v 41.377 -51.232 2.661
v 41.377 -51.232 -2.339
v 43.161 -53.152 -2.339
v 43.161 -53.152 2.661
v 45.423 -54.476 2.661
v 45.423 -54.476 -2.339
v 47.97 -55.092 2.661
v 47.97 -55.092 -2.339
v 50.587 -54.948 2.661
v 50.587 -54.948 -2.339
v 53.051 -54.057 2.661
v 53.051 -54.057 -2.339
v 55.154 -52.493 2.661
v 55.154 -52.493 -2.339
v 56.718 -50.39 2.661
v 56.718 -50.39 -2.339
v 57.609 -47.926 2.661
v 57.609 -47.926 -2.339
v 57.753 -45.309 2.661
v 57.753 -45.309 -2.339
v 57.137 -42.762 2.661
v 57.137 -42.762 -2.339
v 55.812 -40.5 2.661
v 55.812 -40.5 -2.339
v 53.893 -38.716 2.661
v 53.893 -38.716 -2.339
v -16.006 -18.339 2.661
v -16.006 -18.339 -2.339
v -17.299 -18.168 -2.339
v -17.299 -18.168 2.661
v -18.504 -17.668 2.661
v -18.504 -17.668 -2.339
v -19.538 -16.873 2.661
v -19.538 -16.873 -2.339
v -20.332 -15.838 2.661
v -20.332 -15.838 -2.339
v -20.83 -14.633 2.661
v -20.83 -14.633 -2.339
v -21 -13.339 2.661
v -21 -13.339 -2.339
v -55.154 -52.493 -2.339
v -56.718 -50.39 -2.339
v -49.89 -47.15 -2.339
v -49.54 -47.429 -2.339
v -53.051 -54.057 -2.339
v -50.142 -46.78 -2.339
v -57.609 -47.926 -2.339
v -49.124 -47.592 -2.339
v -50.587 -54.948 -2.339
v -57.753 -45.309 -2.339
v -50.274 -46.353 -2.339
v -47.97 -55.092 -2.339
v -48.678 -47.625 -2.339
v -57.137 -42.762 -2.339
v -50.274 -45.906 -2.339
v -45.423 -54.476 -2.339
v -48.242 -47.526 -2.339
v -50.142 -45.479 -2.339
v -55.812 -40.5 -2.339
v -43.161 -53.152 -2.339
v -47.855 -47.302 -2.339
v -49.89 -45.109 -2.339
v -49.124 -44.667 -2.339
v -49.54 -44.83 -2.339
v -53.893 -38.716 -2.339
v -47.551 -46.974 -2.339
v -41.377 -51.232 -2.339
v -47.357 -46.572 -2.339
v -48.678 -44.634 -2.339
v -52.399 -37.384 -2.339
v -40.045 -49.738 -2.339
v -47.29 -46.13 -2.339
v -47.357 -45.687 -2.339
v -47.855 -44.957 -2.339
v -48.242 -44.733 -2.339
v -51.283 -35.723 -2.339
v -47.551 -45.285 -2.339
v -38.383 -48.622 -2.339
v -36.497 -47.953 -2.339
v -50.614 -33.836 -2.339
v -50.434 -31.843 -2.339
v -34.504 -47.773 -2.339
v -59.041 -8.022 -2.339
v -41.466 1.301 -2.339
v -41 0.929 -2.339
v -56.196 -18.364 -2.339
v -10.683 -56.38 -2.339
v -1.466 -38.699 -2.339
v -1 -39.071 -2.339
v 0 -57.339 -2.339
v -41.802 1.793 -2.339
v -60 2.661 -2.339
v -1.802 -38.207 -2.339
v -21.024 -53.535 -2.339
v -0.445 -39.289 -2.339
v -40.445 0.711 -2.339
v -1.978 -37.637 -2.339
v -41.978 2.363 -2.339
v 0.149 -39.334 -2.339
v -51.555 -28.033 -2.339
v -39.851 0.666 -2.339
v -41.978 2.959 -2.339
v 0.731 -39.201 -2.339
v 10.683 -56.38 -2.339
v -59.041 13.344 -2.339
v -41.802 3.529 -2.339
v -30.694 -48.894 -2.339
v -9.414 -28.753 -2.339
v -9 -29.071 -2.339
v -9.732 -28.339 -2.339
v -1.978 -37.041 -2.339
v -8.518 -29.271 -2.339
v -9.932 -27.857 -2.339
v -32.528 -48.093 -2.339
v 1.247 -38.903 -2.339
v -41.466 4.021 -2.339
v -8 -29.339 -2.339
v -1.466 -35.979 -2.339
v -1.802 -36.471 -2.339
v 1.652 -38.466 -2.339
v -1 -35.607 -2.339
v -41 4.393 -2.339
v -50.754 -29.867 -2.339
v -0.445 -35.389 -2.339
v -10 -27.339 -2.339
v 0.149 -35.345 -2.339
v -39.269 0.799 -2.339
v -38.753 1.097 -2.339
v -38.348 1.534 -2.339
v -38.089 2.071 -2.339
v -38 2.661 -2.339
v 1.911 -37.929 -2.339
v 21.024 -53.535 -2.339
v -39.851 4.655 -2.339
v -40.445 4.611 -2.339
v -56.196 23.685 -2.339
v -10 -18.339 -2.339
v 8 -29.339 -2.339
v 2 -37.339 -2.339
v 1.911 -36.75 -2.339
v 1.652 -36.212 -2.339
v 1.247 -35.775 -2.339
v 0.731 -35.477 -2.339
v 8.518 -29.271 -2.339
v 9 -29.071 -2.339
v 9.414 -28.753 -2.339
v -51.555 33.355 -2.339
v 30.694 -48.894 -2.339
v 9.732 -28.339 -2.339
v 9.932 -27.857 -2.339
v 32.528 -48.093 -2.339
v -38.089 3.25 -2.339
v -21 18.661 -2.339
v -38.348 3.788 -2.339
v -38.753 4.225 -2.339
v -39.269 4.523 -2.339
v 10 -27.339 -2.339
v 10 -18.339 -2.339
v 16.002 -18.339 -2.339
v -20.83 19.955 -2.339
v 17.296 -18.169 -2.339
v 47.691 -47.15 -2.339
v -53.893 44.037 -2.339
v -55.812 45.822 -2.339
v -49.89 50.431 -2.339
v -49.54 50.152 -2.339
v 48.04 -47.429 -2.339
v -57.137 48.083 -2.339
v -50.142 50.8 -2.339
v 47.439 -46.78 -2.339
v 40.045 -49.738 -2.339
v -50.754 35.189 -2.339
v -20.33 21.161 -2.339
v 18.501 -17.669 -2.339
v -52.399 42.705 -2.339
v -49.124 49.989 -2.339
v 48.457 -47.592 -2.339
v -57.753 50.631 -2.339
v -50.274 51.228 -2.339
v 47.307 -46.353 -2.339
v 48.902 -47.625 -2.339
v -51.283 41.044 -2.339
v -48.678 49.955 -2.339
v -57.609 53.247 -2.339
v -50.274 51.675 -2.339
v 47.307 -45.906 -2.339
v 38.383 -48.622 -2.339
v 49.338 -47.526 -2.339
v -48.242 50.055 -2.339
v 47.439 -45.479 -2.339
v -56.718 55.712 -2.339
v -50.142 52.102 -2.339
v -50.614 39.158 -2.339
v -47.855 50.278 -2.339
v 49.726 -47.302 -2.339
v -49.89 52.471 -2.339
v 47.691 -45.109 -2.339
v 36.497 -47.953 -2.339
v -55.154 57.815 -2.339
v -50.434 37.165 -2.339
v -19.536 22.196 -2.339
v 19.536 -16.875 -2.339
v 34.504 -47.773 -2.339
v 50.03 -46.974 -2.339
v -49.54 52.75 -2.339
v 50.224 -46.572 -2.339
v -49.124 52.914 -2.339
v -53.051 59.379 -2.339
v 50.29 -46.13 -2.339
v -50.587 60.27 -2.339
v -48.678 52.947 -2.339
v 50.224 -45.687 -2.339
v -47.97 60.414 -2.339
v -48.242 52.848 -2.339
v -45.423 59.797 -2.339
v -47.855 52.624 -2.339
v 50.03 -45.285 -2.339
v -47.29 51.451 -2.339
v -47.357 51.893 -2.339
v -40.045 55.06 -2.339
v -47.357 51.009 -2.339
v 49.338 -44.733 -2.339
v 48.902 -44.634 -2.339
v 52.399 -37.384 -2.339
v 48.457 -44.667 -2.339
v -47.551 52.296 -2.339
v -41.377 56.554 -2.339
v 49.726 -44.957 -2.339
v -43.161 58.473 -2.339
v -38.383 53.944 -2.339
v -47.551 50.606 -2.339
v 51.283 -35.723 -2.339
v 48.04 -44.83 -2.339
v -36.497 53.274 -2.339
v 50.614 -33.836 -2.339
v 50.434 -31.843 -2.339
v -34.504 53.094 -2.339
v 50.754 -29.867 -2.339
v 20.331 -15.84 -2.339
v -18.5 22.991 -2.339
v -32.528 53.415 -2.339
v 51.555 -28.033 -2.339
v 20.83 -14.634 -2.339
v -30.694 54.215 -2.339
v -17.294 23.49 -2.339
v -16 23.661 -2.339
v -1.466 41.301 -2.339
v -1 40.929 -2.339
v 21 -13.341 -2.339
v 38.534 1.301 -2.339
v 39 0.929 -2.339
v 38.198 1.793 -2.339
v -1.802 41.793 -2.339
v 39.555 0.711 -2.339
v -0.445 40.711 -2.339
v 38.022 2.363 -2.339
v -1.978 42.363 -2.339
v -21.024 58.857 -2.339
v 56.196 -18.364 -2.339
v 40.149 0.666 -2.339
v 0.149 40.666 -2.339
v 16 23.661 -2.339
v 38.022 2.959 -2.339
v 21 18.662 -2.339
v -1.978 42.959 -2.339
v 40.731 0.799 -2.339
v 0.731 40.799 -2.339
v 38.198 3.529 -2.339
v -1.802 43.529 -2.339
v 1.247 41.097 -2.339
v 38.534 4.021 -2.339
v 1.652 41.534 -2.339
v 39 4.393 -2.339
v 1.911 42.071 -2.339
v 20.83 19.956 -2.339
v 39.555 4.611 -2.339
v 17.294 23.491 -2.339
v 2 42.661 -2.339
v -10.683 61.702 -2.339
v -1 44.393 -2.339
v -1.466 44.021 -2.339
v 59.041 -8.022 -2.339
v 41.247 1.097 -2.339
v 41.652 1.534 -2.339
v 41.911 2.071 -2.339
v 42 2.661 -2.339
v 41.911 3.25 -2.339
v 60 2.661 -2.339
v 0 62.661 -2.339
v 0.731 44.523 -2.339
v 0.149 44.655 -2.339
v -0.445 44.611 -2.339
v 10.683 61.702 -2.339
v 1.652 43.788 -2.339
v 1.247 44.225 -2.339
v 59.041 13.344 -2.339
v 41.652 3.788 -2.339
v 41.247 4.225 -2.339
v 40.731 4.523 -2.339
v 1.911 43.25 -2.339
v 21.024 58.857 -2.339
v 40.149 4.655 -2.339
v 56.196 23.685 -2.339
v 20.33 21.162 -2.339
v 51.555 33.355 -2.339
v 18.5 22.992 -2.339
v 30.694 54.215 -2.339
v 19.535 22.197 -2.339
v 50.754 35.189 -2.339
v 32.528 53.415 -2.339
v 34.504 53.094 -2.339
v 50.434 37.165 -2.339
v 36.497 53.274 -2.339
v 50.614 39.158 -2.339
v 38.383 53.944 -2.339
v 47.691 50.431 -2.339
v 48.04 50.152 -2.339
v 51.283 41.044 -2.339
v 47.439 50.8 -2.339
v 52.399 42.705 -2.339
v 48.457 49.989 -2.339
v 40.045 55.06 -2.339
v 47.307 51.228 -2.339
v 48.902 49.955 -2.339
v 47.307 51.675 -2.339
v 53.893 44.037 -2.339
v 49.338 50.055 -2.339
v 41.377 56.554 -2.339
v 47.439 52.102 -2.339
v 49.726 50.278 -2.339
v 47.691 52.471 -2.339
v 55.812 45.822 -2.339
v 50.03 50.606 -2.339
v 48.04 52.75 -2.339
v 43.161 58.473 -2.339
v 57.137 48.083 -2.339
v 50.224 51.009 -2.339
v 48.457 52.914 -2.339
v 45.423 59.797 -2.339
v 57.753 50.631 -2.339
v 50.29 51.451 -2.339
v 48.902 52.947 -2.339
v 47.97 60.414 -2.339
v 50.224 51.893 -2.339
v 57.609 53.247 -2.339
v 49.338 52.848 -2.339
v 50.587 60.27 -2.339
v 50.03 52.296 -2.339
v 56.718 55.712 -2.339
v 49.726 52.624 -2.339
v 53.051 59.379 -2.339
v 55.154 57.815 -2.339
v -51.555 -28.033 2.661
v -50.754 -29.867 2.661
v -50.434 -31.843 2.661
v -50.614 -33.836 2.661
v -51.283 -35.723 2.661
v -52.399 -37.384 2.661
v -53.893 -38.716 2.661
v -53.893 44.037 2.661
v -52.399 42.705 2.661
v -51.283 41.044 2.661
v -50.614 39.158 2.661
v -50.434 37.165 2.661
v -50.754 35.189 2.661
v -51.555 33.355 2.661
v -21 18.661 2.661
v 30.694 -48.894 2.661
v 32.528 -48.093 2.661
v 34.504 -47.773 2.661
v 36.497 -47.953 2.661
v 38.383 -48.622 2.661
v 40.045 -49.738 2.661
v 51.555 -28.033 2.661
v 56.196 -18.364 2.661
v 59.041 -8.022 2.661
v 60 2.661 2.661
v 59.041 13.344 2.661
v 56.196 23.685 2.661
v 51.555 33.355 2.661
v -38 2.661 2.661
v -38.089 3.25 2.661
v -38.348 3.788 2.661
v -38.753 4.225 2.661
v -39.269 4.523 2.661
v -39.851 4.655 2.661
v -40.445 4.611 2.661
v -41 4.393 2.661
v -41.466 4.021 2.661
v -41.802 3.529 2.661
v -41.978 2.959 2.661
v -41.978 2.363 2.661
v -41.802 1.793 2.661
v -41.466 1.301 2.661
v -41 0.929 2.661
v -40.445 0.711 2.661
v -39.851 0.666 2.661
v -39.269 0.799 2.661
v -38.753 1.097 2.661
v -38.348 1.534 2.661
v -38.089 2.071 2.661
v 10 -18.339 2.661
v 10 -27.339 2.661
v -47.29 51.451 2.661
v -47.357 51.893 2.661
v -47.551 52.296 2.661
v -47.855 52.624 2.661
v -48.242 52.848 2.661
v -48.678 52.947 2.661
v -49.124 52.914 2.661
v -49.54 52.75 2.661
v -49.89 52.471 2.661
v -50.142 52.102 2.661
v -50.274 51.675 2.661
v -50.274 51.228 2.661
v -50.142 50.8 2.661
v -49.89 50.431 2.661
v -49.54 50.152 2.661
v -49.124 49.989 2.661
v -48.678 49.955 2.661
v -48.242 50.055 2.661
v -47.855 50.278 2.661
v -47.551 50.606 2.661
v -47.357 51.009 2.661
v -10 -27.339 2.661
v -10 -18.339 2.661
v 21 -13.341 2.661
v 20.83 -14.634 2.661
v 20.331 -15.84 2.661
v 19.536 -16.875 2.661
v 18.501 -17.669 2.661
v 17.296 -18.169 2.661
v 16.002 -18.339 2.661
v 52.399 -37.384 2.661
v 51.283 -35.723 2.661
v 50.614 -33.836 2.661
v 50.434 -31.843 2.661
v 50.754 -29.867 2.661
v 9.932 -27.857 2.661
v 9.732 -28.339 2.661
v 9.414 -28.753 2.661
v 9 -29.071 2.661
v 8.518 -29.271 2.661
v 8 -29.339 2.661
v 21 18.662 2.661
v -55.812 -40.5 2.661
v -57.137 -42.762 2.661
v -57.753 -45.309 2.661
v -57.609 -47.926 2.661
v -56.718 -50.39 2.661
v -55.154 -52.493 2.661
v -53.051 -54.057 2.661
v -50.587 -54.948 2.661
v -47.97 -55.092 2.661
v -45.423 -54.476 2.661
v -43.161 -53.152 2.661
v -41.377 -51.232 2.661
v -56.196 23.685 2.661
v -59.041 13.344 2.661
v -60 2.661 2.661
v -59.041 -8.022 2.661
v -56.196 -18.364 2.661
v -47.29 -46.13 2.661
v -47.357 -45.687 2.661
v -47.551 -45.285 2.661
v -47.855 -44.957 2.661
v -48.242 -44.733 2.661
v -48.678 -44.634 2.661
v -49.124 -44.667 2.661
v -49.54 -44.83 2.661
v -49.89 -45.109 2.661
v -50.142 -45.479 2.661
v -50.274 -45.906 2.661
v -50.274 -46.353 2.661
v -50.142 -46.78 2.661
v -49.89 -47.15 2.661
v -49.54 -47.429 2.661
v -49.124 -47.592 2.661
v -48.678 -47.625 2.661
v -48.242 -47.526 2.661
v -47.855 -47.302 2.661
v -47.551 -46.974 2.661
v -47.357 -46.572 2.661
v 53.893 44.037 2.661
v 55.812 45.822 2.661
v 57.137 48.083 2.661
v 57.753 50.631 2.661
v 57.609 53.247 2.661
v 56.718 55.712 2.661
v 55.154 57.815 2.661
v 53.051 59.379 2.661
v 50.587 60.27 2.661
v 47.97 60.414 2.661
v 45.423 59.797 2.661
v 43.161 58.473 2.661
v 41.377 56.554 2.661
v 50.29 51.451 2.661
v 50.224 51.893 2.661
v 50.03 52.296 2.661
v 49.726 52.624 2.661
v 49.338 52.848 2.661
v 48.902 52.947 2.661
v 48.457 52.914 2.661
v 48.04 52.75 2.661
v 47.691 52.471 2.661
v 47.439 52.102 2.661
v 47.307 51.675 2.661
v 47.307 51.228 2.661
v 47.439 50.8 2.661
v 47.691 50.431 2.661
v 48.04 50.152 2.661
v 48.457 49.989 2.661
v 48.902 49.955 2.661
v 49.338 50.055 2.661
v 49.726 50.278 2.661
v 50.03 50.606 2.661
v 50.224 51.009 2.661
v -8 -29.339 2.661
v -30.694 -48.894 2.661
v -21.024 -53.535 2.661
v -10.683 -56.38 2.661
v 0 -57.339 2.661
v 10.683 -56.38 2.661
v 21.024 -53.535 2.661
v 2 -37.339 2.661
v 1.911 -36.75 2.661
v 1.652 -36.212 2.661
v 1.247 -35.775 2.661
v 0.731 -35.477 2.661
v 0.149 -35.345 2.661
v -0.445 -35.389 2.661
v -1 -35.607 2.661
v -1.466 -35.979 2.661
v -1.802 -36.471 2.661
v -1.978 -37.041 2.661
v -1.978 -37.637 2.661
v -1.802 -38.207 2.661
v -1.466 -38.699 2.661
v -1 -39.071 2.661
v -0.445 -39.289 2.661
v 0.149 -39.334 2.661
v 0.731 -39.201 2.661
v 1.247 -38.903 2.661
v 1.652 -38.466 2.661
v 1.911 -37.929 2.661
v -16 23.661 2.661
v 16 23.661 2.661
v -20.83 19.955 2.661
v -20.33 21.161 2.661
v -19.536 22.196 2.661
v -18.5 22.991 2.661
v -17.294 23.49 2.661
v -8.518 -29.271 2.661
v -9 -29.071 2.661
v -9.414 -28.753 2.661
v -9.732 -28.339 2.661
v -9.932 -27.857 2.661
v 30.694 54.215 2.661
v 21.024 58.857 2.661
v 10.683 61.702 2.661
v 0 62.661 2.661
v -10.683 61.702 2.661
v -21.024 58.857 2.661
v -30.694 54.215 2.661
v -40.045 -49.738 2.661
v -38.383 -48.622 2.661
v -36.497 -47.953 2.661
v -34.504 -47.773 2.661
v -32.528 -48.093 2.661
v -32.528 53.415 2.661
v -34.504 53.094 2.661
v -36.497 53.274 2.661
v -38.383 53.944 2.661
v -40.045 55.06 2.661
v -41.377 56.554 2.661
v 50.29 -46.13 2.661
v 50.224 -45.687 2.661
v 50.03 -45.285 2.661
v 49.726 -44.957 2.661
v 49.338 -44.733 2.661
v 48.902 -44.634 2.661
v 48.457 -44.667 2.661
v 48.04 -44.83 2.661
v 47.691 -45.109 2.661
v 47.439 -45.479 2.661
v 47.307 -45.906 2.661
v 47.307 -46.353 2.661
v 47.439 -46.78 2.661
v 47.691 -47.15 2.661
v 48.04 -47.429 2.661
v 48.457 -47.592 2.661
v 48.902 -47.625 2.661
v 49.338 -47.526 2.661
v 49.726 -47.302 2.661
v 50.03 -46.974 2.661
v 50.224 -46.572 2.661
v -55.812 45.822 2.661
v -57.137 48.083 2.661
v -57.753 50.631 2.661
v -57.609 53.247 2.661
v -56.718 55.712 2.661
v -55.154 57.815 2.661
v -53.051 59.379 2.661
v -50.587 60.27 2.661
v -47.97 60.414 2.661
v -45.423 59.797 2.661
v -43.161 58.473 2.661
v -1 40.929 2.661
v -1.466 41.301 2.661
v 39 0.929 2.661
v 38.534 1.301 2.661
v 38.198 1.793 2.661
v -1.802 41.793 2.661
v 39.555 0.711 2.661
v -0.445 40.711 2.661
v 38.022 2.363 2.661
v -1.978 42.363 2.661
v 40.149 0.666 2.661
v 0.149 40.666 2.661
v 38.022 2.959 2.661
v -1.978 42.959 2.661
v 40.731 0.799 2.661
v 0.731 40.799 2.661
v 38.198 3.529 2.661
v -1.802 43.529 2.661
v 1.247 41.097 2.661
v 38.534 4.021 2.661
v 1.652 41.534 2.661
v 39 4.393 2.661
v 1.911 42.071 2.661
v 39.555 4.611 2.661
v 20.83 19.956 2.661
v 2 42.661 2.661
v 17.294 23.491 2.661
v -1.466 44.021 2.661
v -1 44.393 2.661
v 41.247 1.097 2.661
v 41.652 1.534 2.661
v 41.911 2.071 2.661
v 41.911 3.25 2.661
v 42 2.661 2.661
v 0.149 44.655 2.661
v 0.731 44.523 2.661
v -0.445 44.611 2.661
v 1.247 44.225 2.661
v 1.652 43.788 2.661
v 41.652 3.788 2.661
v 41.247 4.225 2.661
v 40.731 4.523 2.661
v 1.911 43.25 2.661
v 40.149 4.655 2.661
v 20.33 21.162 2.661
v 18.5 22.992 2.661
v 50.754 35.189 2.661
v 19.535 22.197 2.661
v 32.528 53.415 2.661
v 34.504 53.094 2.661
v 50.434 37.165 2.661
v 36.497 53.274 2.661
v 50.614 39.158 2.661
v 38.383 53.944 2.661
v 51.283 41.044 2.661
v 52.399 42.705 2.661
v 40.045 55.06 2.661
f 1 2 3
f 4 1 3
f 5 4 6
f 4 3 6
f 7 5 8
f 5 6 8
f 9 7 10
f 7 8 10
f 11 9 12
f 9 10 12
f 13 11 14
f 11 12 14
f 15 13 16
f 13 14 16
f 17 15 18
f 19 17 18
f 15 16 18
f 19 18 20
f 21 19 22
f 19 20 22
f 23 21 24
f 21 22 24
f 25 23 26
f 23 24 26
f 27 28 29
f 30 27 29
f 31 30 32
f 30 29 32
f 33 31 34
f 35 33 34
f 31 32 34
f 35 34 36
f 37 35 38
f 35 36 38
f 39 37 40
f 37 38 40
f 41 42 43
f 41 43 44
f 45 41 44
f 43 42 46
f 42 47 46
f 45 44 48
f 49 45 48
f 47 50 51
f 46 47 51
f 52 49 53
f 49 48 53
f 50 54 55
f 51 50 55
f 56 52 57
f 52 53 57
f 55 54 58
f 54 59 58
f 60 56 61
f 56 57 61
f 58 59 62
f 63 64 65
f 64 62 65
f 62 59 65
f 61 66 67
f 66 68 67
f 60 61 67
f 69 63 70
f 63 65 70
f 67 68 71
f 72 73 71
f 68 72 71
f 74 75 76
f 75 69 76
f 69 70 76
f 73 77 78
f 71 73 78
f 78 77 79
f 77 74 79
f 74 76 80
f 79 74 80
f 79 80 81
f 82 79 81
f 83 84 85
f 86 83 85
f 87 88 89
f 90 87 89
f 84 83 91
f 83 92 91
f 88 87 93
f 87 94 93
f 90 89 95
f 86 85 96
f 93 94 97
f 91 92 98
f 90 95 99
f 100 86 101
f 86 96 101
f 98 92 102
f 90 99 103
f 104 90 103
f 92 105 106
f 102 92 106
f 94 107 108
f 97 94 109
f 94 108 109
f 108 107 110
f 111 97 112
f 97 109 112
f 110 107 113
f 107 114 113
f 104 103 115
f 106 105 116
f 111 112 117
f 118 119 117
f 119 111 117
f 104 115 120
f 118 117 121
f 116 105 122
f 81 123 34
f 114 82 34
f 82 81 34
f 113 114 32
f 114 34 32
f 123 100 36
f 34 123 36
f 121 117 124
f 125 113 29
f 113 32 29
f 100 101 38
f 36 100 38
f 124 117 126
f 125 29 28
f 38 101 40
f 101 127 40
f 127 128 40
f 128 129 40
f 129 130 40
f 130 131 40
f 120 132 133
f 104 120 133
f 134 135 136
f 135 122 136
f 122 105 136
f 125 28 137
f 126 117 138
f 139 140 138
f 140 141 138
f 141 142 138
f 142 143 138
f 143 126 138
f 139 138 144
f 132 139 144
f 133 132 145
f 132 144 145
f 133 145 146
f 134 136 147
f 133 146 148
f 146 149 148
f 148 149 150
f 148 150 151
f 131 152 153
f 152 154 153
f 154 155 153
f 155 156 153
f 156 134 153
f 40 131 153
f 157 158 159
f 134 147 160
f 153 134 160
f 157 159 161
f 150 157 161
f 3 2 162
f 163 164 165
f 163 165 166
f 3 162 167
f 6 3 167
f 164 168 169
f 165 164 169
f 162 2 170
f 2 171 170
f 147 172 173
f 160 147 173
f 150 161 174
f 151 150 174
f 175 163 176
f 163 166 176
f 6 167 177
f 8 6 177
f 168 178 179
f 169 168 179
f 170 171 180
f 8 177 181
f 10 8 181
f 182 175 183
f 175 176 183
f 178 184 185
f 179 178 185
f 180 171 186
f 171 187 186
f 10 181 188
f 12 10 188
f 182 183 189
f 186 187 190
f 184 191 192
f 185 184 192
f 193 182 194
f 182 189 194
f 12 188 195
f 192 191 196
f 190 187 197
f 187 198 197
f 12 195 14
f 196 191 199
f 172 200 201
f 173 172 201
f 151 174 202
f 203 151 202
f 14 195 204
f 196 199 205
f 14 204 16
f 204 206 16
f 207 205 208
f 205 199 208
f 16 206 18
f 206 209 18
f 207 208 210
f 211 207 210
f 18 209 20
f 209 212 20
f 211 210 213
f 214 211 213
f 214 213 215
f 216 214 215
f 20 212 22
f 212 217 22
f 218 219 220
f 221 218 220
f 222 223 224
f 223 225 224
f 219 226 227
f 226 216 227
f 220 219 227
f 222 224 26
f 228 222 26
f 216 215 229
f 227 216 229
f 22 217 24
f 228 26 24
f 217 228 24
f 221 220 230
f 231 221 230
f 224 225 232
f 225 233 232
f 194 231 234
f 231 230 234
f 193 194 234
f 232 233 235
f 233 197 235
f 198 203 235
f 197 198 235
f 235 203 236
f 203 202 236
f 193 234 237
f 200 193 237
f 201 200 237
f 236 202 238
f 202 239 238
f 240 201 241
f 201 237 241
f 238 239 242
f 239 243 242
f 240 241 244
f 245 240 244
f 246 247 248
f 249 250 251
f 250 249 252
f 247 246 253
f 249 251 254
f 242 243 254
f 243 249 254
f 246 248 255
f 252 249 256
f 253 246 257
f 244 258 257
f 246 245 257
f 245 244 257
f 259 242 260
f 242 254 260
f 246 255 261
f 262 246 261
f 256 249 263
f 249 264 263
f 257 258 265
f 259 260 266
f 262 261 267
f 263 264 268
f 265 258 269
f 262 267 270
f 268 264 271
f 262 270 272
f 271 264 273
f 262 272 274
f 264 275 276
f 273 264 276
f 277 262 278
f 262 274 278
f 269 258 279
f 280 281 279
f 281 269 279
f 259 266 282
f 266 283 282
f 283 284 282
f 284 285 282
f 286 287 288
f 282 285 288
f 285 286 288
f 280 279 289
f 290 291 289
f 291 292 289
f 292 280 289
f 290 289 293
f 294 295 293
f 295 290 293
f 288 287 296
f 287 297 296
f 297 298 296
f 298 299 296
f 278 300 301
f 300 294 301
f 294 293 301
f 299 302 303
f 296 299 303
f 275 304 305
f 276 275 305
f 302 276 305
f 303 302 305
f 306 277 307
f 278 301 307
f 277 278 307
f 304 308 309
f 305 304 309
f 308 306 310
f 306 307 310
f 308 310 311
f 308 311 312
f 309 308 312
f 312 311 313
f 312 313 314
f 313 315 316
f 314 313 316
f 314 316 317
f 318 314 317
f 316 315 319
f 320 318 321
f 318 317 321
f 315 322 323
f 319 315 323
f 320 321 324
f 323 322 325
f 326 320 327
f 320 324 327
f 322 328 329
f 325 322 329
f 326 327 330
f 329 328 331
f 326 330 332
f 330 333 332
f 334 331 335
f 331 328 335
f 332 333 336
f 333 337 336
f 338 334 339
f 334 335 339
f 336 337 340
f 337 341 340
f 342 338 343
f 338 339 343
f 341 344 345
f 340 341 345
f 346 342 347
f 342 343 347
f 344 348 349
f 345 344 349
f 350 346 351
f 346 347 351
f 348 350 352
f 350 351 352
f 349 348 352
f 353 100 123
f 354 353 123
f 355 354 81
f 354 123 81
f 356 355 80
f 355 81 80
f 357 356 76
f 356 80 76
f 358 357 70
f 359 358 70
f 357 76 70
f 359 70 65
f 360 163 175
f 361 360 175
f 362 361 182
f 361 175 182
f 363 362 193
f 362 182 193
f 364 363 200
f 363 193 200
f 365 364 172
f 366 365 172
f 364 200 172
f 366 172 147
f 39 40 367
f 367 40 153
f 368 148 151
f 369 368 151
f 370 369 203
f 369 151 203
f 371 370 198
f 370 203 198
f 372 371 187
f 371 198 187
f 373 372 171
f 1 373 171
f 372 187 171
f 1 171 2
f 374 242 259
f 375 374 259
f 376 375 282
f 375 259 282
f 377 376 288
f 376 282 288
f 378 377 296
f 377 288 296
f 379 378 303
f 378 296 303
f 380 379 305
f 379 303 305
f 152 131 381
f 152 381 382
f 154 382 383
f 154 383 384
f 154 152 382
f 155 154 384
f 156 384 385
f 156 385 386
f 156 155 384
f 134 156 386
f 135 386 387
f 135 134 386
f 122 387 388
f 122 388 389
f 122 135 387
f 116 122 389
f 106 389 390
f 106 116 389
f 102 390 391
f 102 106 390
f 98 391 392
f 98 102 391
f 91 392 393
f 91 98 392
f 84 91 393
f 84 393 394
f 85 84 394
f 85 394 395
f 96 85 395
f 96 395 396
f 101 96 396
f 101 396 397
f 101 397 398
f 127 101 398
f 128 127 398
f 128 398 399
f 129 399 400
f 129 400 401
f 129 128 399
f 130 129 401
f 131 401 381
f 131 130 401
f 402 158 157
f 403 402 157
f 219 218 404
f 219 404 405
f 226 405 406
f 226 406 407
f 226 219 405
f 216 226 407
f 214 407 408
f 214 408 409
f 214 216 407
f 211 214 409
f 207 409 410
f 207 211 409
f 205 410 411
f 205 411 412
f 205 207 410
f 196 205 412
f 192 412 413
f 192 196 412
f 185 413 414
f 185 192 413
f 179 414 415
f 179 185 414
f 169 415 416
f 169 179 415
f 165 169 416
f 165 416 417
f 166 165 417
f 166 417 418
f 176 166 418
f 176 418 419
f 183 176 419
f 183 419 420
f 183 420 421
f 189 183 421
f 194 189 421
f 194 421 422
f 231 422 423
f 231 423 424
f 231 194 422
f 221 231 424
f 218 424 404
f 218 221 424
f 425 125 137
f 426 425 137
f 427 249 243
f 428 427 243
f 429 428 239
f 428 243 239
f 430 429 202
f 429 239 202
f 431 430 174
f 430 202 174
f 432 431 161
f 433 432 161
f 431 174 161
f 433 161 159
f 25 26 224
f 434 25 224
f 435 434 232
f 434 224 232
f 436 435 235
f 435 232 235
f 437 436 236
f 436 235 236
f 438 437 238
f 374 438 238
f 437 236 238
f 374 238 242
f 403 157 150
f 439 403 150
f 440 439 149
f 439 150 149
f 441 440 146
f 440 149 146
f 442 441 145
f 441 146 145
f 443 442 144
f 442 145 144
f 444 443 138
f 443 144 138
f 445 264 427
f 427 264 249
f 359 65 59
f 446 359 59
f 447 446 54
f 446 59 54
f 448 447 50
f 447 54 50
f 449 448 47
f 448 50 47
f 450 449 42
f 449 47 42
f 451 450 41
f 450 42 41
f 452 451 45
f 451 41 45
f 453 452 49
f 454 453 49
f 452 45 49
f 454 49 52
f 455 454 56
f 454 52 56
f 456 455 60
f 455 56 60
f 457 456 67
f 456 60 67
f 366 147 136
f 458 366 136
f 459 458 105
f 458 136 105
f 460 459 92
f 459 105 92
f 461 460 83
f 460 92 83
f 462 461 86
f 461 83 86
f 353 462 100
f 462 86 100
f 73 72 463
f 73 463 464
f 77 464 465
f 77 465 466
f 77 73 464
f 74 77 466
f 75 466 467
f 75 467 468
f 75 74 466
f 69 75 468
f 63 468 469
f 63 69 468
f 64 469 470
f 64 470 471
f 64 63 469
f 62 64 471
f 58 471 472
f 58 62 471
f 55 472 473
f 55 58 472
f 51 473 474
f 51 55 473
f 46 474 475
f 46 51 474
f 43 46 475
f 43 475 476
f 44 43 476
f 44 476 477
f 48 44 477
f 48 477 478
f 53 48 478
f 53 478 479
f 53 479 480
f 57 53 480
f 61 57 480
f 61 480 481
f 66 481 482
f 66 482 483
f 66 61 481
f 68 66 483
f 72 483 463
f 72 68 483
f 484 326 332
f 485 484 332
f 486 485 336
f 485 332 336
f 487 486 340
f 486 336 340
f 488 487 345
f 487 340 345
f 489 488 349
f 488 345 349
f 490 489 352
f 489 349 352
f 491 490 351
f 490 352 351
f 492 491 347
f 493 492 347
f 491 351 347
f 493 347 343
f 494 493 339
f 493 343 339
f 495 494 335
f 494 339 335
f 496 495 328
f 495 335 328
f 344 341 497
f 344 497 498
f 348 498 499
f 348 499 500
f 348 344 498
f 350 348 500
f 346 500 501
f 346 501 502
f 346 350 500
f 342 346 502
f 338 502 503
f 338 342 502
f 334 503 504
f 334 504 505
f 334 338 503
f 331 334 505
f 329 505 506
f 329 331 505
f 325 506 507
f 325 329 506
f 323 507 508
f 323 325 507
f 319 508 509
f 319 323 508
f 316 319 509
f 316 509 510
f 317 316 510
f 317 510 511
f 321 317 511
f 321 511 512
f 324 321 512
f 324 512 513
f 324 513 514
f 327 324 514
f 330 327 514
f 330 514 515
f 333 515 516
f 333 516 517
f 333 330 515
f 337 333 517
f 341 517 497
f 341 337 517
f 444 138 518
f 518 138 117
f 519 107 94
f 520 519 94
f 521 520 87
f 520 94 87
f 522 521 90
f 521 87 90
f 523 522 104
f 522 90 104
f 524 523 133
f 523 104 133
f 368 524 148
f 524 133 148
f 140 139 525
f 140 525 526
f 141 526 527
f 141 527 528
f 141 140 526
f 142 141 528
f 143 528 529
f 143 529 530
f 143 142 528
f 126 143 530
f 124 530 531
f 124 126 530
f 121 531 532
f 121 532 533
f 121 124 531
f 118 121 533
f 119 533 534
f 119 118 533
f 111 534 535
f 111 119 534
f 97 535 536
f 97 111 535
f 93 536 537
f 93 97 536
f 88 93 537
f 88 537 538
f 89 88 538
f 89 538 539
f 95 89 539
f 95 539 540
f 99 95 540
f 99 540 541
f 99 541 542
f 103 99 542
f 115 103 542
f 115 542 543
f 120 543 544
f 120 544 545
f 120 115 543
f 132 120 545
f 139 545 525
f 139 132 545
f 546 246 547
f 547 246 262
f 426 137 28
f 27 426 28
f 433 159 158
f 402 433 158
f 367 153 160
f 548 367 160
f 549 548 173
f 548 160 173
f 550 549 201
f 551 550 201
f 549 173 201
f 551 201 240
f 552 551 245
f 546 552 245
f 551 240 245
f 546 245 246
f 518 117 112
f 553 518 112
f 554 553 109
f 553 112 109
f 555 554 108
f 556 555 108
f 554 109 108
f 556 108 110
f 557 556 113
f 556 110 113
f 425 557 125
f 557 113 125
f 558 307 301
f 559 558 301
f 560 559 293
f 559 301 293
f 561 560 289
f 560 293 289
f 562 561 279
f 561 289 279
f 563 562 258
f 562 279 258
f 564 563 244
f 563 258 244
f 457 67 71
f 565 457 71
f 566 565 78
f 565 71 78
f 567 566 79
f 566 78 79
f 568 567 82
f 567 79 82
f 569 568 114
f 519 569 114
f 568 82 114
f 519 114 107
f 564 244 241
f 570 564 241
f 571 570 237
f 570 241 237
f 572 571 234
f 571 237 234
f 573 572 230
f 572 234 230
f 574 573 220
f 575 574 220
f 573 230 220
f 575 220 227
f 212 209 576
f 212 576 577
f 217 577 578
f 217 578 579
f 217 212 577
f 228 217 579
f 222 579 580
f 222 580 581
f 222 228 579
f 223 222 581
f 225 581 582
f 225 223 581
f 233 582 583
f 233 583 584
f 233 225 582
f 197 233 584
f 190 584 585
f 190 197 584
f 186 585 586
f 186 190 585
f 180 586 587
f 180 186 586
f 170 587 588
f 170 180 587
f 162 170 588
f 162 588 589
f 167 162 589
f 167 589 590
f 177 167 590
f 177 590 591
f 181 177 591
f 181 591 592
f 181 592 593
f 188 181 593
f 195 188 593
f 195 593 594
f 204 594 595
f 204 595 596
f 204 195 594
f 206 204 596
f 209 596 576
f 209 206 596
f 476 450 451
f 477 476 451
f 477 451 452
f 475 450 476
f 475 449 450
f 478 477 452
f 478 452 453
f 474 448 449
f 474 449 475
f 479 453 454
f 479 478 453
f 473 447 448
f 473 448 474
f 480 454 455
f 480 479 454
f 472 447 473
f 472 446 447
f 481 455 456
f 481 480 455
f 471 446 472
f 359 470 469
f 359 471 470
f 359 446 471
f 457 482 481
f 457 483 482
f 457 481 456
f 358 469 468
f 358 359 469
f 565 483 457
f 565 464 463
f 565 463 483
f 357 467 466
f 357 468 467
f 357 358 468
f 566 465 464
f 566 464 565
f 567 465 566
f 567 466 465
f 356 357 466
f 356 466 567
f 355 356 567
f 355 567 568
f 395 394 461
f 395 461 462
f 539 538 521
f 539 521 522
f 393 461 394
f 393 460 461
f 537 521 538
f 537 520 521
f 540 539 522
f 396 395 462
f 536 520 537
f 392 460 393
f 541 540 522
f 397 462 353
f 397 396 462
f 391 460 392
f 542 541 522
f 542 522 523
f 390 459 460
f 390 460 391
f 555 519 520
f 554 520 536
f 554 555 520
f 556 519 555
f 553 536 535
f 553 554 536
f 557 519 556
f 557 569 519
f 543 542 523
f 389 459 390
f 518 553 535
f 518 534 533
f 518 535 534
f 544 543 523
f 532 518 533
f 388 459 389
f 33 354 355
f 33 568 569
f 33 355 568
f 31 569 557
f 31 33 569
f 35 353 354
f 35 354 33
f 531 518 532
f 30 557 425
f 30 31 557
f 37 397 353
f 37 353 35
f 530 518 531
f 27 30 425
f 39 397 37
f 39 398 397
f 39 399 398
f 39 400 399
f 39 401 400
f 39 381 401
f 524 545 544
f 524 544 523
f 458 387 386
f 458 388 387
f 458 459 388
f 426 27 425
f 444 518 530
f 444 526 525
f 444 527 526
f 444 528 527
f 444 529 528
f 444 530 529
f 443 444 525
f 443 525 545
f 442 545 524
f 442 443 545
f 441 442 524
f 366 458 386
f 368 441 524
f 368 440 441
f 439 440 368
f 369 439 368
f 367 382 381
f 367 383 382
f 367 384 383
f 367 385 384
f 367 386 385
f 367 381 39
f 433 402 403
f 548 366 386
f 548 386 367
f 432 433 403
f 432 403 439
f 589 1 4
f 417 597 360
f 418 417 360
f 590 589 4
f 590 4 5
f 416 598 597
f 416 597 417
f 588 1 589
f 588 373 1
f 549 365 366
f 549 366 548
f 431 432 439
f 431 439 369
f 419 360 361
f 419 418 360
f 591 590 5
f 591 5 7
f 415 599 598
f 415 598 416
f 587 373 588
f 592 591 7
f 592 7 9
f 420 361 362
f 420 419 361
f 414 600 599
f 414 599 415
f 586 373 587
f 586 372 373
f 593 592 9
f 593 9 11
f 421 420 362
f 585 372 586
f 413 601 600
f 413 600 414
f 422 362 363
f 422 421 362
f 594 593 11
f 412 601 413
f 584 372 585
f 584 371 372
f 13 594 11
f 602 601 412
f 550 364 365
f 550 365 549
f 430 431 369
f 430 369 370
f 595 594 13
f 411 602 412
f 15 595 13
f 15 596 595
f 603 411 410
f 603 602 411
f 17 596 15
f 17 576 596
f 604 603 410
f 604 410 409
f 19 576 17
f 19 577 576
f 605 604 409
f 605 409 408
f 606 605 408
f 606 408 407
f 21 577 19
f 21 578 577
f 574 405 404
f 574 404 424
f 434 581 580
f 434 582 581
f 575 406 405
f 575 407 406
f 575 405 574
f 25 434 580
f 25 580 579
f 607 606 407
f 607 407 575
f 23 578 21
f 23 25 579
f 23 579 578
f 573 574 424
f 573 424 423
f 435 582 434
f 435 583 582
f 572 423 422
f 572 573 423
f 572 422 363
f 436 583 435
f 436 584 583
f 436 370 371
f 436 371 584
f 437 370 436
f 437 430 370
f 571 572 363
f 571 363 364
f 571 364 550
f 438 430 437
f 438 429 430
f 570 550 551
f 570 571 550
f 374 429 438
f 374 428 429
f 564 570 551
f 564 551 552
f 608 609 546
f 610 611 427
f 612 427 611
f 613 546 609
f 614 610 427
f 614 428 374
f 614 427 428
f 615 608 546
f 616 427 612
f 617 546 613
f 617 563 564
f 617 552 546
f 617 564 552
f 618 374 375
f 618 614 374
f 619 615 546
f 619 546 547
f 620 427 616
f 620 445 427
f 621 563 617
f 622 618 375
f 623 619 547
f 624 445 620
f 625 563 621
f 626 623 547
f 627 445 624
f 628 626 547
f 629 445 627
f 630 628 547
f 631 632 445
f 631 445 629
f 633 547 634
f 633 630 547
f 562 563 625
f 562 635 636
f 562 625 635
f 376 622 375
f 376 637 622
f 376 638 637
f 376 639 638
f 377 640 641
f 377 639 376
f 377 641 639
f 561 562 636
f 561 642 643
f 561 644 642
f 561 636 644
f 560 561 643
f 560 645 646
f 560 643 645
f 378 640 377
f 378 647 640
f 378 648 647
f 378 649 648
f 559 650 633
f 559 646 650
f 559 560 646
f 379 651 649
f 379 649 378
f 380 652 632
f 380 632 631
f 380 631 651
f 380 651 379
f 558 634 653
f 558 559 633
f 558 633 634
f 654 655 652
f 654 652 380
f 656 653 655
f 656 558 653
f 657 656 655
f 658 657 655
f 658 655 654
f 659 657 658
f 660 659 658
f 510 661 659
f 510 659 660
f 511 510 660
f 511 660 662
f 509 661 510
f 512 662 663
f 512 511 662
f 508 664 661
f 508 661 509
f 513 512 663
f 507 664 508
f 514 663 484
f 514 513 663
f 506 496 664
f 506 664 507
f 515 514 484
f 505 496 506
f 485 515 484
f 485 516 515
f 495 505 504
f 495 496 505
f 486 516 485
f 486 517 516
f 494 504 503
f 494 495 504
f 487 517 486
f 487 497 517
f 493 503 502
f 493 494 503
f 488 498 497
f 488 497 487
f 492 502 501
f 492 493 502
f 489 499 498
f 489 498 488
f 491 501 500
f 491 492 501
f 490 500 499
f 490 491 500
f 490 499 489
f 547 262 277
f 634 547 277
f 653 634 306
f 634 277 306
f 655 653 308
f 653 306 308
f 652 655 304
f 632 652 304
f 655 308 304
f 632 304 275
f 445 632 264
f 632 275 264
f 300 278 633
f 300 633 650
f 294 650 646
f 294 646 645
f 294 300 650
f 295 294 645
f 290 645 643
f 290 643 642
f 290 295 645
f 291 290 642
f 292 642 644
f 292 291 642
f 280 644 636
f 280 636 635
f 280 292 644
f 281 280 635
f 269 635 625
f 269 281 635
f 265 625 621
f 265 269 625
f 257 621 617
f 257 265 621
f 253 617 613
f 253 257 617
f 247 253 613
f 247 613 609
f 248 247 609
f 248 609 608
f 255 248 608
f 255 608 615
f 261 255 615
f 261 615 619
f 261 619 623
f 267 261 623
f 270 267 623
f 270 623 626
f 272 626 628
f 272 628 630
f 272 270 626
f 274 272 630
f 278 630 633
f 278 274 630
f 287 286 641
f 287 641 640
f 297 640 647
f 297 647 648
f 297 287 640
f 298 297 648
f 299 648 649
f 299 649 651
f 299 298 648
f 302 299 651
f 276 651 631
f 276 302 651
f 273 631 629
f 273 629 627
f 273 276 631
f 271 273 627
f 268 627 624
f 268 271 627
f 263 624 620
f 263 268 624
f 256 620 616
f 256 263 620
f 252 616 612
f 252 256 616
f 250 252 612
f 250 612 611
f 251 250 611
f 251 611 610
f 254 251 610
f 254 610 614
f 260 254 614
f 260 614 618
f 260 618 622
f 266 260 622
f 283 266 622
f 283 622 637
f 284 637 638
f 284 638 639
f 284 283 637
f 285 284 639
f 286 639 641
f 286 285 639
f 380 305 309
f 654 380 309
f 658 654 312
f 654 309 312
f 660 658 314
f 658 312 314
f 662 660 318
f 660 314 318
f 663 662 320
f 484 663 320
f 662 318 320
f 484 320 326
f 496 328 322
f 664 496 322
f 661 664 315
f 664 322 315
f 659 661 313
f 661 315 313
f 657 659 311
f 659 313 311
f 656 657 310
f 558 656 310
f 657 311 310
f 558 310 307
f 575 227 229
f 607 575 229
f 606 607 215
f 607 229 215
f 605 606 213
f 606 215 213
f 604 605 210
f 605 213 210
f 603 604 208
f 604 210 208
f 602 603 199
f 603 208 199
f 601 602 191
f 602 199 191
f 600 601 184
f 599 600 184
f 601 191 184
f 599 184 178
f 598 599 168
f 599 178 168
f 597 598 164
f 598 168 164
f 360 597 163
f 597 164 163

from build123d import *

# Parameters (mm, degrees)
SKETCH1_R             = 1.5
SKETCH1_R_2           = 2
BOSS_EXTRUDE1_DEPTH   = 5
BODY_MOVE_COPY1_ANGLE = 90


with BuildPart() as part:
    # Sketch1 → Boss-Extrude1 (new body)
    with BuildSketch(Plane(origin=(0, 0, 0), x_dir=(1, 0, 0), z_dir=(0, 1, 0))):
        with BuildLine():
            ThreePointArc((41.376602734, 53.892924716), (36.497232574, 50.613564399), (30.69404934, 51.554585976))
            ThreePointArc((30.69404934, 51.554585976), (0, 60), (-30.69404934, 51.554585976))
            ThreePointArc((-30.69404934, 51.554585976), (-36.497232574, 50.613564399), (-41.376602734, 53.892924716))
            ThreePointArc((-41.376602734, 53.892924716), (-55.154328933, 55.154328933), (-53.892924716, 41.376602734))
            ThreePointArc((-53.892924716, 41.376602734), (-50.613564399, 36.497232574), (-51.554585976, 30.69404934))
            ThreePointArc((-51.554585976, 30.69404934), (-60, 0), (-51.554585976, -30.69404934))
            ThreePointArc((-51.554585976, -30.69404934), (-50.613564399, -36.497232574), (-53.892924716, -41.376602734))
            ThreePointArc((-53.892924716, -41.376602734), (-55.154328933, -55.154328933), (-41.376602734, -53.892924716))
            ThreePointArc((-41.376602734, -53.892924716), (-36.497232574, -50.613564399), (-30.69404934, -51.554585976))
            ThreePointArc((-30.69404934, -51.554585976), (0, -60), (30.69404934, -51.554585976))
            ThreePointArc((30.69404934, -51.554585976), (36.497232574, -50.613564399), (41.376602734, -53.892924716))
            ThreePointArc((41.376602734, -53.892924716), (55.154328933, -55.154328933), (53.892924716, -41.376602734))
            ThreePointArc((53.892924716, -41.376602734), (50.613564399, -36.497232574), (51.554585976, -30.69404934))
            ThreePointArc((51.554585976, -30.69404934), (60, 0), (51.554585976, 30.69404934))
            ThreePointArc((51.554585976, 30.69404934), (50.613564399, 36.497232574), (53.892924716, 41.376602734))
            ThreePointArc((53.892924716, 41.376602734), (55.154328933, 55.154328933), (41.376602734, 53.892924716))
        make_face()
        with Locations((-48.790367902, -48.790367902)):
            Circle(SKETCH1_R, mode=Mode.SUBTRACT)
        with Locations((0, -40)):
            Circle(SKETCH1_R_2, mode=Mode.SUBTRACT)
        with Locations((48.790367902, -48.790367902)):
            Circle(SKETCH1_R, mode=Mode.SUBTRACT)
        with BuildLine():
            Line((16.001917019, -21), (10, -21))
            Line((10, -21), (10, -30.000108076))
            ThreePointArc((10, -30.000108076), (9.414180319, -31.414301502), (7.999957489, -32.000050194))
            Line((7.999957489, -32.000050194), (-8.000158272, -32.000050194))
            ThreePointArc((-8.000158272, -32.000050194), (-9.414280711, -31.414259919), (-10, -30.000108076))
            Line((-10, -30.000108076), (-10, -21))
            Line((-10, -21), (-16.005742178, -21))
            ThreePointArc((-16.005742178, -21), (-19.538404995, -19.534344662), (-21, -16))
            Line((-21, -16), (-21, 16))
            ThreePointArc((-21, 16), (-19.535533906, 19.535533906), (-16, 21))
            Line((-16, 21), (16, 21))
            ThreePointArc((16, 21), (19.535388079, 19.536388365), (21.000355251, 16.001561768))
            Line((21.000355251, 16.001561768), (21.000355251, -16.001561768))
            ThreePointArc((21.000355251, -16.001561768), (19.536346588, -19.535991337), (16.001917019, -21))
        make_face(mode=Mode.SUBTRACT)
        with Locations((40, 0)):
            Circle(SKETCH1_R_2, mode=Mode.SUBTRACT)
        with Locations((-40, 0)):
            Circle(SKETCH1_R_2, mode=Mode.SUBTRACT)
        with Locations((-48.790367902, 48.790367902)):
            Circle(SKETCH1_R, mode=Mode.SUBTRACT)
        with Locations((0, 40)):
            Circle(SKETCH1_R_2, mode=Mode.SUBTRACT)
        with Locations((48.790367902, 48.790367902)):
            Circle(SKETCH1_R, mode=Mode.SUBTRACT)
    extrude(amount=BOSS_EXTRUDE1_DEPTH)


with BuildPart() as part_1:
    # Body-Move/Copy1: moved
    add(part.part.rotate(Axis((0, 2.5, 0.160861545), (1, 0, 0)), BODY_MOVE_COPY1_ANGLE))


solid = part_1.part
